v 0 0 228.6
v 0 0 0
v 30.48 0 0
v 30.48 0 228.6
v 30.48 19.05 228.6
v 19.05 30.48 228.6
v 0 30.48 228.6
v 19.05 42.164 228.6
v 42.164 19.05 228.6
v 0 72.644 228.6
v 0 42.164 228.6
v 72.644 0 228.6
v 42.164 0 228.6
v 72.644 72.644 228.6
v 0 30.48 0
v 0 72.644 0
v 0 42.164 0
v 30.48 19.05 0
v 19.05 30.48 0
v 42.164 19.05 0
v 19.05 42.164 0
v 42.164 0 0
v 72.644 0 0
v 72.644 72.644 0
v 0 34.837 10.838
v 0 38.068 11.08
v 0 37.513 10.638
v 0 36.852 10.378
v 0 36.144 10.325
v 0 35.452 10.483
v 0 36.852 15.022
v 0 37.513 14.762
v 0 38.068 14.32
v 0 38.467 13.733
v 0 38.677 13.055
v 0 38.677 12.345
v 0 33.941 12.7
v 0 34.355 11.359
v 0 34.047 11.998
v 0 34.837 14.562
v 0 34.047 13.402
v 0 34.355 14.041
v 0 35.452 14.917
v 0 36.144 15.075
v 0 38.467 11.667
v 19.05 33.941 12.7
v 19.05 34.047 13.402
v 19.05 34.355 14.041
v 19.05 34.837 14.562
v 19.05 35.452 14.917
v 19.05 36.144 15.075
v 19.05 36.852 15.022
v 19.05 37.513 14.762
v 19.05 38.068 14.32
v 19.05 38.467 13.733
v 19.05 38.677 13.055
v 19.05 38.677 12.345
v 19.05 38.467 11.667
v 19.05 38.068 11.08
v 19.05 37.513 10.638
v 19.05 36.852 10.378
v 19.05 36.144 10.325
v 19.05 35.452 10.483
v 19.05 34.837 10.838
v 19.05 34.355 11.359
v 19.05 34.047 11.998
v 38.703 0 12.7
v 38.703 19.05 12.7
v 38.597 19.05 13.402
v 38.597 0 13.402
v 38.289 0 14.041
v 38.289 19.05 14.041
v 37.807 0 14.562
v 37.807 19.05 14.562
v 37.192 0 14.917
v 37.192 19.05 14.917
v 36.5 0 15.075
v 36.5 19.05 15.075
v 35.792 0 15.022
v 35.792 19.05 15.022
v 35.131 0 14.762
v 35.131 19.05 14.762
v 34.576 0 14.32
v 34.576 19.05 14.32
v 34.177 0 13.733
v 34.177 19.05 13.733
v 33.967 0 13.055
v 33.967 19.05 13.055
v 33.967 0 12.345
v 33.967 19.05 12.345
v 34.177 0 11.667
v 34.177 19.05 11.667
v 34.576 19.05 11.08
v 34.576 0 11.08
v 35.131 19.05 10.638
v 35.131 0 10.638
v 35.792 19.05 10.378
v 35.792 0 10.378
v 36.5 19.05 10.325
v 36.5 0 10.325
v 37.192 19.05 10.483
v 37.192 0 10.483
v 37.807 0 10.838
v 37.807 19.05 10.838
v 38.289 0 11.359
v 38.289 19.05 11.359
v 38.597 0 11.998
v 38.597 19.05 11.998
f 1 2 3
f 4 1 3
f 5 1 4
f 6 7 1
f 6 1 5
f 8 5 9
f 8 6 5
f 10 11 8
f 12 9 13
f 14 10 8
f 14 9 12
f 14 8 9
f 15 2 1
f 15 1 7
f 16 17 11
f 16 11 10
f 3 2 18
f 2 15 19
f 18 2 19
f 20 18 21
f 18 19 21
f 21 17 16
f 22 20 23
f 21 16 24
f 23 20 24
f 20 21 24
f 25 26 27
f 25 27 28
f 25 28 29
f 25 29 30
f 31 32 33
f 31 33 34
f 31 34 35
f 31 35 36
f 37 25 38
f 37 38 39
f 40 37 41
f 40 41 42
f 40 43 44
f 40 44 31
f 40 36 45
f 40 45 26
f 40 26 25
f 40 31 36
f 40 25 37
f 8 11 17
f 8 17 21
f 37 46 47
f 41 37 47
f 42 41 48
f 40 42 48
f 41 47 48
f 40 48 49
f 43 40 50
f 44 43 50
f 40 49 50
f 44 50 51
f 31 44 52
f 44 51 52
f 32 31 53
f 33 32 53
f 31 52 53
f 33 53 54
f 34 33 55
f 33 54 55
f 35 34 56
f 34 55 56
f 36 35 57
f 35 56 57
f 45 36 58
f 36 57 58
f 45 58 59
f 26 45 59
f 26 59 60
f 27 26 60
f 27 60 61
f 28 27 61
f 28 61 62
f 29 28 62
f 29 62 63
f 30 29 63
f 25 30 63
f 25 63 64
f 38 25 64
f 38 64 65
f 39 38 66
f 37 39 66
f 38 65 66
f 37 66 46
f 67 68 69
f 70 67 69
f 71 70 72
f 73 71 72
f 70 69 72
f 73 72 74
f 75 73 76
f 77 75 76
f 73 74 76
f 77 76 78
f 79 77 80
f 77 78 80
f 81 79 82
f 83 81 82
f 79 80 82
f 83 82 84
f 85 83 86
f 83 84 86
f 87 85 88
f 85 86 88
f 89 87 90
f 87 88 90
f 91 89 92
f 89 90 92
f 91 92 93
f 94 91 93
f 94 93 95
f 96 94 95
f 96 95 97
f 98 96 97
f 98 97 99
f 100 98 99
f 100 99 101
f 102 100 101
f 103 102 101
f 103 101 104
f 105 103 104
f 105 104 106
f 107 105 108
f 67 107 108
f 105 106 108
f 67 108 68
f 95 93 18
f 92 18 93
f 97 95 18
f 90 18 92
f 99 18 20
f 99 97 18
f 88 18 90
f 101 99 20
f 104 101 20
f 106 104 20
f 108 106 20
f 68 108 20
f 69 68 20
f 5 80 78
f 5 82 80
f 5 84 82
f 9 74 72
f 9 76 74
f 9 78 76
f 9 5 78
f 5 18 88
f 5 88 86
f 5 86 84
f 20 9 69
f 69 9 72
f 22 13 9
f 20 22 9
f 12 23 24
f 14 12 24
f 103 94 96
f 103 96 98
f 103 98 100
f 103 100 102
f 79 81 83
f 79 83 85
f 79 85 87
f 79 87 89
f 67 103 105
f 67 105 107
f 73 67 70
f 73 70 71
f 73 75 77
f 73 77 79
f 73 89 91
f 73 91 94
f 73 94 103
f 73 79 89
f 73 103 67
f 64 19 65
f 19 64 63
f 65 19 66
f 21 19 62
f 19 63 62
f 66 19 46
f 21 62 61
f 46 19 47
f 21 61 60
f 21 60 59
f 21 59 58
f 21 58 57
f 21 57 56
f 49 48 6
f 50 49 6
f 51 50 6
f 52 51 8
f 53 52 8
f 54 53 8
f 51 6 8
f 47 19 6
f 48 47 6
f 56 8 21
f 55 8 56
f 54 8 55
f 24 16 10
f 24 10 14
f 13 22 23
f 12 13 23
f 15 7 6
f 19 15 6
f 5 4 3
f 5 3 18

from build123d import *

# Parameters (mm, degrees)
F0_W     = 72.644
F0_H     = 72.644
F1_DEPTH = 228.6
F2_W     = 19.05
F2_H     = 11.684
F2_W_2   = 11.684
F2_H_2   = 19.05
F3_DEPTH = 228.601
F4_R     = 2.38125
F5_DEPTH = 19.05
F6_R     = 2.38125
F7_DEPTH = 19.05


with BuildPart() as f1:
    # F0 (on Top) → F1 (new body)
    with BuildSketch(Plane.XY):
        with Locations((36.322, 36.322)):
            Rectangle(F0_W, F0_H)
    extrude(amount=F1_DEPTH)

    # F2 (on face) → F3 (cut, through all)
    with BuildSketch(Plane.XY.offset(228.6)):
        with Locations((9.525, 36.322)):
            Rectangle(F2_W, F2_H)
        with Locations((36.322, 9.525)):
            Rectangle(F2_W_2, F2_H_2)
    extrude(amount=-F3_DEPTH, mode=Mode.SUBTRACT)

    # F4 (on face) → F5 (join, through all)
    with BuildSketch(Plane.XZ.offset(-19.05)):
        with Locations((36.322, 12.7)):
            Circle(F4_R)
    extrude(amount=F5_DEPTH)

    # F6 (on face) → F7 (join, through all)
    with BuildSketch(Plane(origin=(19.05, 0, 0), x_dir=(0, -1, 0), z_dir=(-1, 0, 0))):
        with Locations((-36.322, 12.7)):
            Circle(F6_R)
    extrude(amount=F7_DEPTH)


solid = f1.part
